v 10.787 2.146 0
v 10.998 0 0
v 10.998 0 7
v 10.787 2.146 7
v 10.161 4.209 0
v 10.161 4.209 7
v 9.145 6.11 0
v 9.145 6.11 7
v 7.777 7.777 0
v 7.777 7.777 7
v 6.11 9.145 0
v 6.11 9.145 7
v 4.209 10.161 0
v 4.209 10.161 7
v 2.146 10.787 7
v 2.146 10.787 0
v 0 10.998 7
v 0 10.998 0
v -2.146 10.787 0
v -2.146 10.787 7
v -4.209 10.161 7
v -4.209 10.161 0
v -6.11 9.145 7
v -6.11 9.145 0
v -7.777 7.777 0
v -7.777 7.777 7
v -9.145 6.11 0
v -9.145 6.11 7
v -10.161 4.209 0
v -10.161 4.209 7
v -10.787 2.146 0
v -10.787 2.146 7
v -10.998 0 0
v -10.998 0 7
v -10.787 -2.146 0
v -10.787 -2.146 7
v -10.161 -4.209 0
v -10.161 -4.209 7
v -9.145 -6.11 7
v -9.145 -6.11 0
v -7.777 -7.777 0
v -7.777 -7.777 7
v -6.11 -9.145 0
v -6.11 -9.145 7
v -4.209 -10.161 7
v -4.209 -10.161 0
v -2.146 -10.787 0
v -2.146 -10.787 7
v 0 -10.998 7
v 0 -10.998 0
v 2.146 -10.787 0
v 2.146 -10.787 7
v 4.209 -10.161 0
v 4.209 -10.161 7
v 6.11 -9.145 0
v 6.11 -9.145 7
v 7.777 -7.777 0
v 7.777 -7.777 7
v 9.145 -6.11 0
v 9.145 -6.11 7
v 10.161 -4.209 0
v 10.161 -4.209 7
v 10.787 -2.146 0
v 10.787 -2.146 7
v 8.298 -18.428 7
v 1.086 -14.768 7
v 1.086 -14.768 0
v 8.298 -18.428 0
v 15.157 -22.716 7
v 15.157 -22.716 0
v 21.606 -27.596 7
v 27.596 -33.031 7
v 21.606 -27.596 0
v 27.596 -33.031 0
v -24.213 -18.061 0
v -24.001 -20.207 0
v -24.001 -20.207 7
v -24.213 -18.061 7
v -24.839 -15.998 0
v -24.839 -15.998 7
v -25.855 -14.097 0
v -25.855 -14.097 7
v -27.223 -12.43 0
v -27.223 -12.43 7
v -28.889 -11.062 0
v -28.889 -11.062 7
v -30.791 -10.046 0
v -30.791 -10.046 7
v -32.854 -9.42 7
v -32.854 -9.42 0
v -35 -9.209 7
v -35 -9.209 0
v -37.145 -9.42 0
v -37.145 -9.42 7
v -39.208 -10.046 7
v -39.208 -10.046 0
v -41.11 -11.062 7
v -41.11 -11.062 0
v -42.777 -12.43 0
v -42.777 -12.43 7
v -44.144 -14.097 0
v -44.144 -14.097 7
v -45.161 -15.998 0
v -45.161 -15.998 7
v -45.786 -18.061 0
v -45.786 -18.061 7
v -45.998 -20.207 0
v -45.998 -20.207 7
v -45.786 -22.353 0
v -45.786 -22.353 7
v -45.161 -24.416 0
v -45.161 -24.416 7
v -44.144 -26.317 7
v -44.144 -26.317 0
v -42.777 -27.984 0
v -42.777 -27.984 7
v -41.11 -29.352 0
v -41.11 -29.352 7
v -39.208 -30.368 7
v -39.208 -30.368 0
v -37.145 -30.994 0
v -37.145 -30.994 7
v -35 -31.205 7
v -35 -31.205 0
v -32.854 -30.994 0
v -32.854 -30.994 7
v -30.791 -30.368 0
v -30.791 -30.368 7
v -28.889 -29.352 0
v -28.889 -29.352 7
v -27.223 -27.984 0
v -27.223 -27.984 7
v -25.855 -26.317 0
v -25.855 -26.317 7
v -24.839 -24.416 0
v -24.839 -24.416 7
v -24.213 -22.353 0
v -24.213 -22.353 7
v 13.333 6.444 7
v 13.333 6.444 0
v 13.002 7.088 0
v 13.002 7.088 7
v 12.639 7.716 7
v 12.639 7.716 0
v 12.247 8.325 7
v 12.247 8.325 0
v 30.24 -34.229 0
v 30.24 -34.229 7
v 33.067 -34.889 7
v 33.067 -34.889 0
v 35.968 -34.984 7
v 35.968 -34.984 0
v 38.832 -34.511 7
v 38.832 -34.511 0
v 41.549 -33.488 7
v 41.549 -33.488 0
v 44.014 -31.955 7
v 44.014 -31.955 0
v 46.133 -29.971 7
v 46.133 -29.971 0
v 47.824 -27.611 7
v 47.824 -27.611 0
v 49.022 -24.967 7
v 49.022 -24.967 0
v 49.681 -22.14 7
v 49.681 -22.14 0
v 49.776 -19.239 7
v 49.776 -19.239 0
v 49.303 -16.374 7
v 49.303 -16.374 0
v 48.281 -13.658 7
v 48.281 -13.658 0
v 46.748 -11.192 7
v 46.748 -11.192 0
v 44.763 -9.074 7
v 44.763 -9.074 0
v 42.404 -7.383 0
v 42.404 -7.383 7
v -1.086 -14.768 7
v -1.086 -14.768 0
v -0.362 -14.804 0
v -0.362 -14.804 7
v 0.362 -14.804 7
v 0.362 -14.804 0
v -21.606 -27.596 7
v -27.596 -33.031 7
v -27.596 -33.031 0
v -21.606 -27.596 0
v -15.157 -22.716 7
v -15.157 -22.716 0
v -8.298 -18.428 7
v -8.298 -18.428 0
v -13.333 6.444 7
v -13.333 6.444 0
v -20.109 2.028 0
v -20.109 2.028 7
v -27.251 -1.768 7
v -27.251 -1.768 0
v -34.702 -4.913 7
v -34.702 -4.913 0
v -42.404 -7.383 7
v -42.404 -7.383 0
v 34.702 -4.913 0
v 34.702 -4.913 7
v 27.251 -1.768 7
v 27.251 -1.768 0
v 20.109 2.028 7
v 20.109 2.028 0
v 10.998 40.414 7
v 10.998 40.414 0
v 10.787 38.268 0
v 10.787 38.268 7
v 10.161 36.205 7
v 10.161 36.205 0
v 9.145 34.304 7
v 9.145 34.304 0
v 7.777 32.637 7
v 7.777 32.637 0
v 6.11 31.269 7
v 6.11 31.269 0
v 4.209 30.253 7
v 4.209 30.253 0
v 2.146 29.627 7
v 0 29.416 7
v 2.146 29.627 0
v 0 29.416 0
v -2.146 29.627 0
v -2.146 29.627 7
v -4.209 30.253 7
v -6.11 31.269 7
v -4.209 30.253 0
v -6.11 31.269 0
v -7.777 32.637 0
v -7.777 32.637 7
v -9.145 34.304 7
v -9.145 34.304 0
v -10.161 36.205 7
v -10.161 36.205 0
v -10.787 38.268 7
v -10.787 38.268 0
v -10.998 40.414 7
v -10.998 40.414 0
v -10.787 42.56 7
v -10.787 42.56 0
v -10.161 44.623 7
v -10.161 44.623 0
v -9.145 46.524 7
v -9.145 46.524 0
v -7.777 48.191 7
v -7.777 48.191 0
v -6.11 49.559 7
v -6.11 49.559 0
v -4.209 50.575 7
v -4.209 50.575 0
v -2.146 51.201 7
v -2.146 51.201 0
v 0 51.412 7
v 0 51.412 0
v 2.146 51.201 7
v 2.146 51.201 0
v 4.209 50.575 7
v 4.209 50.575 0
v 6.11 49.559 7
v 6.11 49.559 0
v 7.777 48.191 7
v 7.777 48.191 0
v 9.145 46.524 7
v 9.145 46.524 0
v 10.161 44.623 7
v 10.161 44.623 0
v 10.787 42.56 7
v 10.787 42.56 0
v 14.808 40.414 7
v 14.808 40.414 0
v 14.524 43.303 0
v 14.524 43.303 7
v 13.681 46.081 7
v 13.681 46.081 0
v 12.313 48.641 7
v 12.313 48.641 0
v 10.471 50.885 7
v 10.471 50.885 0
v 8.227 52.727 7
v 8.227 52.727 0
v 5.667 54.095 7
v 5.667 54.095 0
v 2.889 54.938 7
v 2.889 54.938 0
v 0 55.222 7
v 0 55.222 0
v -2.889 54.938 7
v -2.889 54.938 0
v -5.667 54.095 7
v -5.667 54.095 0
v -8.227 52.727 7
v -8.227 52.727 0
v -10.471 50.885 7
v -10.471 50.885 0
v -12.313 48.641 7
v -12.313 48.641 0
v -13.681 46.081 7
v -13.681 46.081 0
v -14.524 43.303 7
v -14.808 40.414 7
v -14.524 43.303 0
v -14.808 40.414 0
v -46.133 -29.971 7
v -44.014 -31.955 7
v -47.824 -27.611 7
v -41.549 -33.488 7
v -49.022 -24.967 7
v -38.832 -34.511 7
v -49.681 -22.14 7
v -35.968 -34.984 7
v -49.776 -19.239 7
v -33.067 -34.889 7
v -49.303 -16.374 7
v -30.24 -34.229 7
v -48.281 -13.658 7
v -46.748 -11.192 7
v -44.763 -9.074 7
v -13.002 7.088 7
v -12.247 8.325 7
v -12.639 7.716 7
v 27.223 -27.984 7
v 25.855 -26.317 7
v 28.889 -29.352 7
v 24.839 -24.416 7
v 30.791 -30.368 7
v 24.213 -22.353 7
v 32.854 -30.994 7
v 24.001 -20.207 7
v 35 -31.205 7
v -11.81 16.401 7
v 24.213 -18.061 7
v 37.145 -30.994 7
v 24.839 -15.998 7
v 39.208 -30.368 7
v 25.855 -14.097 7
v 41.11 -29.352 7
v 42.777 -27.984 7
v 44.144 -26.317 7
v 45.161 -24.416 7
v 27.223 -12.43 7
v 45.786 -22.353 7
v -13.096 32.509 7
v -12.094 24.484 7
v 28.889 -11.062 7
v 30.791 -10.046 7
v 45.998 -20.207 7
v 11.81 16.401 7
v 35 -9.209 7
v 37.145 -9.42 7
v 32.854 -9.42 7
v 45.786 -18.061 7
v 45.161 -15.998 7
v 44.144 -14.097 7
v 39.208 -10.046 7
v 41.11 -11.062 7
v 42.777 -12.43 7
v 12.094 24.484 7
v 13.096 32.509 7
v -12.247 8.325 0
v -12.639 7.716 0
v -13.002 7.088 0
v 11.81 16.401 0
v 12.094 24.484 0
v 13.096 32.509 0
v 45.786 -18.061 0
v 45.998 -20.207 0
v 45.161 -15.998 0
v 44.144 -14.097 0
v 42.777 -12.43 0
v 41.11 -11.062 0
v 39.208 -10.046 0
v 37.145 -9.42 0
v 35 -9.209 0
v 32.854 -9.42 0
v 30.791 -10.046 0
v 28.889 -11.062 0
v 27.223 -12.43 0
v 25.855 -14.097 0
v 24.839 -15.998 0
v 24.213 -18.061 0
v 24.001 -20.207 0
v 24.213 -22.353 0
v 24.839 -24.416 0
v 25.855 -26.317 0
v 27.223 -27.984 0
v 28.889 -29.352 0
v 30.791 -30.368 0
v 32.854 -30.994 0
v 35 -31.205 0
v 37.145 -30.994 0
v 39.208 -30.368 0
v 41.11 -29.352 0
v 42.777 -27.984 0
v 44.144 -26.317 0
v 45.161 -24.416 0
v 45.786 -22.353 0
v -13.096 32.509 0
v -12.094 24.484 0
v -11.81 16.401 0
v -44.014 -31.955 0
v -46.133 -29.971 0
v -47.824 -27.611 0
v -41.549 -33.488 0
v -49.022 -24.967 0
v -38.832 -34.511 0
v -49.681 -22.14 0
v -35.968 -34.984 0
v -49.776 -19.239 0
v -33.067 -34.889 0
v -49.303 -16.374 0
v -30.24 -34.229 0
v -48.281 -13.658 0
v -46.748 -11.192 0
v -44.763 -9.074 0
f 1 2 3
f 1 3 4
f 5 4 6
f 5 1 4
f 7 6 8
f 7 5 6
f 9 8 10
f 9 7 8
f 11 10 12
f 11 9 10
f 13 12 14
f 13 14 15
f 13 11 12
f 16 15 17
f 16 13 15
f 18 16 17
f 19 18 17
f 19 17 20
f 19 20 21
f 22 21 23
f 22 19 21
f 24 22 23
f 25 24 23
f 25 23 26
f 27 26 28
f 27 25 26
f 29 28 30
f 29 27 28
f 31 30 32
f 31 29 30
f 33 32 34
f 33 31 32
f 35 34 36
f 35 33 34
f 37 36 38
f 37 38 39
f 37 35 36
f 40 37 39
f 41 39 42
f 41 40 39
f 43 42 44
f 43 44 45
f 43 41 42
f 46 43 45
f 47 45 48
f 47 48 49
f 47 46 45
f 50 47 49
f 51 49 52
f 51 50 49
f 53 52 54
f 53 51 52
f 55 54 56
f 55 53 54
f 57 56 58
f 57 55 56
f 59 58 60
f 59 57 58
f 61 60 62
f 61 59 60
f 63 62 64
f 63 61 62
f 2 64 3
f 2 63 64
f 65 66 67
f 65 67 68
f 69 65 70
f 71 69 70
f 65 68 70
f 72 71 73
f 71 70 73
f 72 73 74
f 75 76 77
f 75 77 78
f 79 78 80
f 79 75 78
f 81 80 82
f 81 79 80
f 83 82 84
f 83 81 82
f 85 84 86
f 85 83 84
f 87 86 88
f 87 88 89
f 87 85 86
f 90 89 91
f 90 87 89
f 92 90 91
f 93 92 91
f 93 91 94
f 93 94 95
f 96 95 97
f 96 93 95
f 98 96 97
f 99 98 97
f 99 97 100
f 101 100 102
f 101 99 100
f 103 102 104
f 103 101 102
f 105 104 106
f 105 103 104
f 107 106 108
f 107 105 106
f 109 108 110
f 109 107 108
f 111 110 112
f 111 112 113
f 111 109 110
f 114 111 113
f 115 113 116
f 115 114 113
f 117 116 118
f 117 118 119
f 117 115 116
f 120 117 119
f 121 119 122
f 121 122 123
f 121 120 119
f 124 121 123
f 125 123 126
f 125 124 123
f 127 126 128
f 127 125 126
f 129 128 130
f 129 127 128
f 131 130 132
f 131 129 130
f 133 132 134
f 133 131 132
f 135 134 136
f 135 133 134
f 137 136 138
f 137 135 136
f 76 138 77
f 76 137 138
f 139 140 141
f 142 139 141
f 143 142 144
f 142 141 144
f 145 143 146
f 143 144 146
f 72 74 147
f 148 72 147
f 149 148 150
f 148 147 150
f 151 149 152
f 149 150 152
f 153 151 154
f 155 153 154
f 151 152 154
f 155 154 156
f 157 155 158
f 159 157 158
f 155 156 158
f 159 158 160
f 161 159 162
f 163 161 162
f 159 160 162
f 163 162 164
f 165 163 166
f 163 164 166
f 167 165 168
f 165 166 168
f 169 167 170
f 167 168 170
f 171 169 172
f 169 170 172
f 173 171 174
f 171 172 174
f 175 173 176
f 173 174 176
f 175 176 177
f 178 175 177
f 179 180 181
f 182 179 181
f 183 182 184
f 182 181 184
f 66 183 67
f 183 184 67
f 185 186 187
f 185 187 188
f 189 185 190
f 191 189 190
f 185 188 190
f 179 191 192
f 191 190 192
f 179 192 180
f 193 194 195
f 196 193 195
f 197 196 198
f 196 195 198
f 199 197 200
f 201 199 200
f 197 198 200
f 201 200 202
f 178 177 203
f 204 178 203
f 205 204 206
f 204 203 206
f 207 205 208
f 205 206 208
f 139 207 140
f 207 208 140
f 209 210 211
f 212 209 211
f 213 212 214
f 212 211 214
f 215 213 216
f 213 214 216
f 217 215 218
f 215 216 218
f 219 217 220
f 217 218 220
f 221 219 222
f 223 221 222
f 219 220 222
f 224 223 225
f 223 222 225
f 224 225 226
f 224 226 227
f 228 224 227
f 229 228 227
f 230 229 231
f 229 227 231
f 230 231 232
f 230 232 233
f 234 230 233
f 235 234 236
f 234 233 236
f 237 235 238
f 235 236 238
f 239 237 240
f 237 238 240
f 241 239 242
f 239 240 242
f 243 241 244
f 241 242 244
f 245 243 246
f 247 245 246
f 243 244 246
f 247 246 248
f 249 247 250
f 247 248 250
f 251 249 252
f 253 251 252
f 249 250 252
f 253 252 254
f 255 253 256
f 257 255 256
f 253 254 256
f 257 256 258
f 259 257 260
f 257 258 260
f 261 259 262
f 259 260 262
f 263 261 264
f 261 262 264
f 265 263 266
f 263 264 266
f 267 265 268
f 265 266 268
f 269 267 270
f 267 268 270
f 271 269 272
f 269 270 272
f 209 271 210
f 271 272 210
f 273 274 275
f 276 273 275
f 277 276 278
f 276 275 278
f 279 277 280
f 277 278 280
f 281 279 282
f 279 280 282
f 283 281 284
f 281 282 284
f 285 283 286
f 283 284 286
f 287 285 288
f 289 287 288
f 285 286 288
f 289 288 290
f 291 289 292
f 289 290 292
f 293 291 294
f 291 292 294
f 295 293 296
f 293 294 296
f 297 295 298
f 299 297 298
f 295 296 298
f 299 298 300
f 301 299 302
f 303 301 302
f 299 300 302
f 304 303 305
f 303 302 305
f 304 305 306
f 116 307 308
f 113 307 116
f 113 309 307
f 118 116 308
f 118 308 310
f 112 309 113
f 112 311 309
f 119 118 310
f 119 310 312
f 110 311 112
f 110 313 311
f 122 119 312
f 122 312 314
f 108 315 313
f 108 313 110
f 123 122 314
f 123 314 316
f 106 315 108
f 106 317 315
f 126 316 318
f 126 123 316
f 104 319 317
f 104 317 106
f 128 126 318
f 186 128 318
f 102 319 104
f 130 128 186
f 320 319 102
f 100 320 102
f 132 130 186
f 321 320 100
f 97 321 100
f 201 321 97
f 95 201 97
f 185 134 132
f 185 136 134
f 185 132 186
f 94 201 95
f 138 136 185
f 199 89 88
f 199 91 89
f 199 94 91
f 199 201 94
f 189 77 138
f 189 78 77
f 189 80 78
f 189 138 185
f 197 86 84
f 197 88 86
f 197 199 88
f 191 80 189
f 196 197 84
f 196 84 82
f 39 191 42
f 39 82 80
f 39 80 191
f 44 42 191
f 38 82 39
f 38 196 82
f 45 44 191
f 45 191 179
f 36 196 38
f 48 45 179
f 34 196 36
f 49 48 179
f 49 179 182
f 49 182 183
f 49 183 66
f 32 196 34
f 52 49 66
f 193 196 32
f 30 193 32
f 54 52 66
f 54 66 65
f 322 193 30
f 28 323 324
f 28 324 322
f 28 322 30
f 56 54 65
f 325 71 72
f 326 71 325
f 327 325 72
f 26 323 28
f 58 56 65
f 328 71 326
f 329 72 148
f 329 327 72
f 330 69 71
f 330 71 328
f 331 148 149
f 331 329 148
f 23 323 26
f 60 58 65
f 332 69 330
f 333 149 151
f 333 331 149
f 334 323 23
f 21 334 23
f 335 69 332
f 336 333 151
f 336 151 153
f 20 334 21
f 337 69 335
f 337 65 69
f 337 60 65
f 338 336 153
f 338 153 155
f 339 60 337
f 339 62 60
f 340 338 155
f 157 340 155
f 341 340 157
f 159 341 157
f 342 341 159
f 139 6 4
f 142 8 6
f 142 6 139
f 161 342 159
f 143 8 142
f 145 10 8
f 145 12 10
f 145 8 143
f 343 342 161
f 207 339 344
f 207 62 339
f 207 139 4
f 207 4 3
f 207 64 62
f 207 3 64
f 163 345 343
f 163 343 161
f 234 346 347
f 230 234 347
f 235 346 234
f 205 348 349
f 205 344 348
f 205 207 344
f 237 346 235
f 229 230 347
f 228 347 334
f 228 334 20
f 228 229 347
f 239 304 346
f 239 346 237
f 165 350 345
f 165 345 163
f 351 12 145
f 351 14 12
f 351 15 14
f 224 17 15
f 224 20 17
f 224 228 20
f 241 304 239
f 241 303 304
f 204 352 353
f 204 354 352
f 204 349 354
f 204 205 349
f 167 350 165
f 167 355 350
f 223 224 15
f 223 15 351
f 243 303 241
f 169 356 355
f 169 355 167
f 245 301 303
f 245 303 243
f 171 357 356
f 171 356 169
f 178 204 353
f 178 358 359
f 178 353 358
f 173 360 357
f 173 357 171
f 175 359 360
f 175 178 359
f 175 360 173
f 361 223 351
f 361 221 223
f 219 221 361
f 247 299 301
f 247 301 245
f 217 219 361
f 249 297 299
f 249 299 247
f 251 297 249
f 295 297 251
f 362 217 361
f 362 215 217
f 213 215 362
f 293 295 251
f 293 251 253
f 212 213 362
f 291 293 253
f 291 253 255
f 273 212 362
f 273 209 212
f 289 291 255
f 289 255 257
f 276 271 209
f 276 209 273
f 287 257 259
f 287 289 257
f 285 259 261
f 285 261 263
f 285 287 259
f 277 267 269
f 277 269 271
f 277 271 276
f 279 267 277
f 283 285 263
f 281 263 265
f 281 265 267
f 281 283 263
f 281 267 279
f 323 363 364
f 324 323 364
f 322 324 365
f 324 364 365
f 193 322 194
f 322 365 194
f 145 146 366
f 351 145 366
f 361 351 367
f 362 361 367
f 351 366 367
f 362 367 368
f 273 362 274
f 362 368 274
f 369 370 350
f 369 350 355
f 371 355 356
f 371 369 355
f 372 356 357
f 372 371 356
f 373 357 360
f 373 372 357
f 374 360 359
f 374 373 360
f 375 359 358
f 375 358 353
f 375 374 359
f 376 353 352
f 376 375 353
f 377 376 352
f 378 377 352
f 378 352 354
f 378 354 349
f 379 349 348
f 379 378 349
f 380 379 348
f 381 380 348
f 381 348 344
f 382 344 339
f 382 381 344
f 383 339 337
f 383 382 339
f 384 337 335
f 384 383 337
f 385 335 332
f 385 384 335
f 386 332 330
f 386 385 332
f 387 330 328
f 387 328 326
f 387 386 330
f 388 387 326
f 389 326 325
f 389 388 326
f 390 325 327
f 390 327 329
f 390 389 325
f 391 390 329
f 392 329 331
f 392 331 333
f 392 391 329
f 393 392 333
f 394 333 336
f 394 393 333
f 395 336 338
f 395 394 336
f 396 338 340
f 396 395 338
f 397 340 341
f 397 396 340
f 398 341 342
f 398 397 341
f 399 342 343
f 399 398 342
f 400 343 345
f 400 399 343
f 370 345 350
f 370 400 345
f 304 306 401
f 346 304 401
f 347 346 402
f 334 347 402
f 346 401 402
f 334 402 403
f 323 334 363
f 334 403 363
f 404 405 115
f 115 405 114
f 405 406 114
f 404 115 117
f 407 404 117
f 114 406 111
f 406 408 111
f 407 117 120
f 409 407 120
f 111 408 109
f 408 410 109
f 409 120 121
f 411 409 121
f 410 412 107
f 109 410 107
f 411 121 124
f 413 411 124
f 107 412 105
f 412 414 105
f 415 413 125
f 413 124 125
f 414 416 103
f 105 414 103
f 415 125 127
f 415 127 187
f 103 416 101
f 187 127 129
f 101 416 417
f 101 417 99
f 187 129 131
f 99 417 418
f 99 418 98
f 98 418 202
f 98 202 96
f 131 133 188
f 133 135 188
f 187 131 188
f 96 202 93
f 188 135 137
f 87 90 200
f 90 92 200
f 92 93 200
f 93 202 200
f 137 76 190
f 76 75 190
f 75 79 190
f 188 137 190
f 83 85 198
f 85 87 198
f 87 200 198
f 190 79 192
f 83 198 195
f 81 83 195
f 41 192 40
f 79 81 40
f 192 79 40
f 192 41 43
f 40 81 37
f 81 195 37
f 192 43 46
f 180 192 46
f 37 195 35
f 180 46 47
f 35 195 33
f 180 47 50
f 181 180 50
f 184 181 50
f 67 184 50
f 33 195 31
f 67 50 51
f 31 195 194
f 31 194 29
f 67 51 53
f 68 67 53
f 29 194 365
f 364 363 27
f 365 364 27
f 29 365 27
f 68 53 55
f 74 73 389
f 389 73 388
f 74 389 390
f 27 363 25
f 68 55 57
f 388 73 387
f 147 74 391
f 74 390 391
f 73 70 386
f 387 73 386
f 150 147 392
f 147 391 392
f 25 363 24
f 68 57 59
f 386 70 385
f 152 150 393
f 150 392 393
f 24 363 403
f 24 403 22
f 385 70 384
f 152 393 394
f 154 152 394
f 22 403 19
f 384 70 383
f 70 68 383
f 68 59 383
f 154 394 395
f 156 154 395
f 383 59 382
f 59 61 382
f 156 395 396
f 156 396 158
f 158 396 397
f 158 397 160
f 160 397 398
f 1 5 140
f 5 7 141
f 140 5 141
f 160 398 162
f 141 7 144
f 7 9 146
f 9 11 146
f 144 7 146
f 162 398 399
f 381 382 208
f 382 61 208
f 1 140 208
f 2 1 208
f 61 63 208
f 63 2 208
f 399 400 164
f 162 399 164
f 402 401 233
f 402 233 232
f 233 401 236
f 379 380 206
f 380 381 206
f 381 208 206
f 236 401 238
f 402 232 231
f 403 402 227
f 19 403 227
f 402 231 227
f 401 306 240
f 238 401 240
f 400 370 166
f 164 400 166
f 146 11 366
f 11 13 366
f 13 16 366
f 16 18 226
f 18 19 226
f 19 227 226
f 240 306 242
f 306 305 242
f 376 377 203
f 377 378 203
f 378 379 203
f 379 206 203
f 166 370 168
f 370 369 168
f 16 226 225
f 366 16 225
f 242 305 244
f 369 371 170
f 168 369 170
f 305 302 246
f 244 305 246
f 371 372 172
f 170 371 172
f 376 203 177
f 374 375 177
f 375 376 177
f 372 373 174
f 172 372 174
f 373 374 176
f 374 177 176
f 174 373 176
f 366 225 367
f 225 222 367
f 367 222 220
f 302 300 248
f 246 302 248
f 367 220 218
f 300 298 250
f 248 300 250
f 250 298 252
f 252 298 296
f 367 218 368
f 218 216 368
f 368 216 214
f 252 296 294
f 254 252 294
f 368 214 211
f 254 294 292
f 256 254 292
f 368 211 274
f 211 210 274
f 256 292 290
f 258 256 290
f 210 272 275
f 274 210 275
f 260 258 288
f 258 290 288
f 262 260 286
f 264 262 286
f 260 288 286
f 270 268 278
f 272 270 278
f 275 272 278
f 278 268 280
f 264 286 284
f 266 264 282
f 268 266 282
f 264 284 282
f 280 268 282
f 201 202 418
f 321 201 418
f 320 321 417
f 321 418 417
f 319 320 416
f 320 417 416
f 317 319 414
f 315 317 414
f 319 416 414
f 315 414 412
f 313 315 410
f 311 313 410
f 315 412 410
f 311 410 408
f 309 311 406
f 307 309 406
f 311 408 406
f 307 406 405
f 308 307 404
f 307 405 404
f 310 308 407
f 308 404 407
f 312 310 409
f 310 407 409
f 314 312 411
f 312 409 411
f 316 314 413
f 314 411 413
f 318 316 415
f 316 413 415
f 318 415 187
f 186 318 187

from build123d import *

# Parameters (mm, degrees)
F0_R     = 10.9982
F1_DEPTH = 7


with BuildPart() as f1:
    # F0 (on Top) → F1 (new body)
    with BuildSketch(Plane.XY):
        with BuildLine():
            ThreePointArc((12.246776, 8.324618), (12.094028, 24.483764), (14.8082, 40.414069))
            ThreePointArc((14.8082, 40.414069), (0, 55.222269), (-14.8082, 40.414069))
            ThreePointArc((-14.8082, 40.414069), (-12.094028, 24.483764), (-12.246776, 8.324618))
            ThreePointArc((-12.246776, 8.324618), (-12.824277, 7.4041), (-13.332719, 6.44371))
            ThreePointArc((-13.332719, 6.44371), (-27.250576, -1.768146), (-42.40371, -7.382757))
            ThreePointArc((-42.40371, -7.382757), (-47.823888, -27.611134), (-27.59551, -33.031312))
            ThreePointArc((-27.59551, -33.031312), (-15.156548, -22.715618), (-1.085942, -14.768328))
            ThreePointArc((-1.085942, -14.768328), (0, -14.8082), (1.085942, -14.768328))
            ThreePointArc((1.085942, -14.768328), (15.156548, -22.715618), (27.59551, -33.031312))
            ThreePointArc((27.59551, -33.031312), (47.823888, -27.611134), (42.40371, -7.382757))
            ThreePointArc((42.40371, -7.382757), (27.250576, -1.768146), (13.332719, 6.44371))
            ThreePointArc((13.332719, 6.44371), (12.824277, 7.4041), (12.246776, 8.324618))
        make_face()
        with Locations((-34.99961, -20.207034)):
            Circle(F0_R, mode=Mode.SUBTRACT)
        with Locations((34.99961, -20.207034)):
            Circle(F0_R, mode=Mode.SUBTRACT)
        Circle(F0_R, mode=Mode.SUBTRACT)
        with BuildLine():
            ThreePointArc((-10.9982, 40.414069), (0, 51.412269), (10.9982, 40.414069))
            ThreePointArc((10.9982, 40.414069), (0, 29.415869), (-10.9982, 40.414069))
        make_face(mode=Mode.SUBTRACT)
    extrude(amount=F1_DEPTH)


solid = f1.part
